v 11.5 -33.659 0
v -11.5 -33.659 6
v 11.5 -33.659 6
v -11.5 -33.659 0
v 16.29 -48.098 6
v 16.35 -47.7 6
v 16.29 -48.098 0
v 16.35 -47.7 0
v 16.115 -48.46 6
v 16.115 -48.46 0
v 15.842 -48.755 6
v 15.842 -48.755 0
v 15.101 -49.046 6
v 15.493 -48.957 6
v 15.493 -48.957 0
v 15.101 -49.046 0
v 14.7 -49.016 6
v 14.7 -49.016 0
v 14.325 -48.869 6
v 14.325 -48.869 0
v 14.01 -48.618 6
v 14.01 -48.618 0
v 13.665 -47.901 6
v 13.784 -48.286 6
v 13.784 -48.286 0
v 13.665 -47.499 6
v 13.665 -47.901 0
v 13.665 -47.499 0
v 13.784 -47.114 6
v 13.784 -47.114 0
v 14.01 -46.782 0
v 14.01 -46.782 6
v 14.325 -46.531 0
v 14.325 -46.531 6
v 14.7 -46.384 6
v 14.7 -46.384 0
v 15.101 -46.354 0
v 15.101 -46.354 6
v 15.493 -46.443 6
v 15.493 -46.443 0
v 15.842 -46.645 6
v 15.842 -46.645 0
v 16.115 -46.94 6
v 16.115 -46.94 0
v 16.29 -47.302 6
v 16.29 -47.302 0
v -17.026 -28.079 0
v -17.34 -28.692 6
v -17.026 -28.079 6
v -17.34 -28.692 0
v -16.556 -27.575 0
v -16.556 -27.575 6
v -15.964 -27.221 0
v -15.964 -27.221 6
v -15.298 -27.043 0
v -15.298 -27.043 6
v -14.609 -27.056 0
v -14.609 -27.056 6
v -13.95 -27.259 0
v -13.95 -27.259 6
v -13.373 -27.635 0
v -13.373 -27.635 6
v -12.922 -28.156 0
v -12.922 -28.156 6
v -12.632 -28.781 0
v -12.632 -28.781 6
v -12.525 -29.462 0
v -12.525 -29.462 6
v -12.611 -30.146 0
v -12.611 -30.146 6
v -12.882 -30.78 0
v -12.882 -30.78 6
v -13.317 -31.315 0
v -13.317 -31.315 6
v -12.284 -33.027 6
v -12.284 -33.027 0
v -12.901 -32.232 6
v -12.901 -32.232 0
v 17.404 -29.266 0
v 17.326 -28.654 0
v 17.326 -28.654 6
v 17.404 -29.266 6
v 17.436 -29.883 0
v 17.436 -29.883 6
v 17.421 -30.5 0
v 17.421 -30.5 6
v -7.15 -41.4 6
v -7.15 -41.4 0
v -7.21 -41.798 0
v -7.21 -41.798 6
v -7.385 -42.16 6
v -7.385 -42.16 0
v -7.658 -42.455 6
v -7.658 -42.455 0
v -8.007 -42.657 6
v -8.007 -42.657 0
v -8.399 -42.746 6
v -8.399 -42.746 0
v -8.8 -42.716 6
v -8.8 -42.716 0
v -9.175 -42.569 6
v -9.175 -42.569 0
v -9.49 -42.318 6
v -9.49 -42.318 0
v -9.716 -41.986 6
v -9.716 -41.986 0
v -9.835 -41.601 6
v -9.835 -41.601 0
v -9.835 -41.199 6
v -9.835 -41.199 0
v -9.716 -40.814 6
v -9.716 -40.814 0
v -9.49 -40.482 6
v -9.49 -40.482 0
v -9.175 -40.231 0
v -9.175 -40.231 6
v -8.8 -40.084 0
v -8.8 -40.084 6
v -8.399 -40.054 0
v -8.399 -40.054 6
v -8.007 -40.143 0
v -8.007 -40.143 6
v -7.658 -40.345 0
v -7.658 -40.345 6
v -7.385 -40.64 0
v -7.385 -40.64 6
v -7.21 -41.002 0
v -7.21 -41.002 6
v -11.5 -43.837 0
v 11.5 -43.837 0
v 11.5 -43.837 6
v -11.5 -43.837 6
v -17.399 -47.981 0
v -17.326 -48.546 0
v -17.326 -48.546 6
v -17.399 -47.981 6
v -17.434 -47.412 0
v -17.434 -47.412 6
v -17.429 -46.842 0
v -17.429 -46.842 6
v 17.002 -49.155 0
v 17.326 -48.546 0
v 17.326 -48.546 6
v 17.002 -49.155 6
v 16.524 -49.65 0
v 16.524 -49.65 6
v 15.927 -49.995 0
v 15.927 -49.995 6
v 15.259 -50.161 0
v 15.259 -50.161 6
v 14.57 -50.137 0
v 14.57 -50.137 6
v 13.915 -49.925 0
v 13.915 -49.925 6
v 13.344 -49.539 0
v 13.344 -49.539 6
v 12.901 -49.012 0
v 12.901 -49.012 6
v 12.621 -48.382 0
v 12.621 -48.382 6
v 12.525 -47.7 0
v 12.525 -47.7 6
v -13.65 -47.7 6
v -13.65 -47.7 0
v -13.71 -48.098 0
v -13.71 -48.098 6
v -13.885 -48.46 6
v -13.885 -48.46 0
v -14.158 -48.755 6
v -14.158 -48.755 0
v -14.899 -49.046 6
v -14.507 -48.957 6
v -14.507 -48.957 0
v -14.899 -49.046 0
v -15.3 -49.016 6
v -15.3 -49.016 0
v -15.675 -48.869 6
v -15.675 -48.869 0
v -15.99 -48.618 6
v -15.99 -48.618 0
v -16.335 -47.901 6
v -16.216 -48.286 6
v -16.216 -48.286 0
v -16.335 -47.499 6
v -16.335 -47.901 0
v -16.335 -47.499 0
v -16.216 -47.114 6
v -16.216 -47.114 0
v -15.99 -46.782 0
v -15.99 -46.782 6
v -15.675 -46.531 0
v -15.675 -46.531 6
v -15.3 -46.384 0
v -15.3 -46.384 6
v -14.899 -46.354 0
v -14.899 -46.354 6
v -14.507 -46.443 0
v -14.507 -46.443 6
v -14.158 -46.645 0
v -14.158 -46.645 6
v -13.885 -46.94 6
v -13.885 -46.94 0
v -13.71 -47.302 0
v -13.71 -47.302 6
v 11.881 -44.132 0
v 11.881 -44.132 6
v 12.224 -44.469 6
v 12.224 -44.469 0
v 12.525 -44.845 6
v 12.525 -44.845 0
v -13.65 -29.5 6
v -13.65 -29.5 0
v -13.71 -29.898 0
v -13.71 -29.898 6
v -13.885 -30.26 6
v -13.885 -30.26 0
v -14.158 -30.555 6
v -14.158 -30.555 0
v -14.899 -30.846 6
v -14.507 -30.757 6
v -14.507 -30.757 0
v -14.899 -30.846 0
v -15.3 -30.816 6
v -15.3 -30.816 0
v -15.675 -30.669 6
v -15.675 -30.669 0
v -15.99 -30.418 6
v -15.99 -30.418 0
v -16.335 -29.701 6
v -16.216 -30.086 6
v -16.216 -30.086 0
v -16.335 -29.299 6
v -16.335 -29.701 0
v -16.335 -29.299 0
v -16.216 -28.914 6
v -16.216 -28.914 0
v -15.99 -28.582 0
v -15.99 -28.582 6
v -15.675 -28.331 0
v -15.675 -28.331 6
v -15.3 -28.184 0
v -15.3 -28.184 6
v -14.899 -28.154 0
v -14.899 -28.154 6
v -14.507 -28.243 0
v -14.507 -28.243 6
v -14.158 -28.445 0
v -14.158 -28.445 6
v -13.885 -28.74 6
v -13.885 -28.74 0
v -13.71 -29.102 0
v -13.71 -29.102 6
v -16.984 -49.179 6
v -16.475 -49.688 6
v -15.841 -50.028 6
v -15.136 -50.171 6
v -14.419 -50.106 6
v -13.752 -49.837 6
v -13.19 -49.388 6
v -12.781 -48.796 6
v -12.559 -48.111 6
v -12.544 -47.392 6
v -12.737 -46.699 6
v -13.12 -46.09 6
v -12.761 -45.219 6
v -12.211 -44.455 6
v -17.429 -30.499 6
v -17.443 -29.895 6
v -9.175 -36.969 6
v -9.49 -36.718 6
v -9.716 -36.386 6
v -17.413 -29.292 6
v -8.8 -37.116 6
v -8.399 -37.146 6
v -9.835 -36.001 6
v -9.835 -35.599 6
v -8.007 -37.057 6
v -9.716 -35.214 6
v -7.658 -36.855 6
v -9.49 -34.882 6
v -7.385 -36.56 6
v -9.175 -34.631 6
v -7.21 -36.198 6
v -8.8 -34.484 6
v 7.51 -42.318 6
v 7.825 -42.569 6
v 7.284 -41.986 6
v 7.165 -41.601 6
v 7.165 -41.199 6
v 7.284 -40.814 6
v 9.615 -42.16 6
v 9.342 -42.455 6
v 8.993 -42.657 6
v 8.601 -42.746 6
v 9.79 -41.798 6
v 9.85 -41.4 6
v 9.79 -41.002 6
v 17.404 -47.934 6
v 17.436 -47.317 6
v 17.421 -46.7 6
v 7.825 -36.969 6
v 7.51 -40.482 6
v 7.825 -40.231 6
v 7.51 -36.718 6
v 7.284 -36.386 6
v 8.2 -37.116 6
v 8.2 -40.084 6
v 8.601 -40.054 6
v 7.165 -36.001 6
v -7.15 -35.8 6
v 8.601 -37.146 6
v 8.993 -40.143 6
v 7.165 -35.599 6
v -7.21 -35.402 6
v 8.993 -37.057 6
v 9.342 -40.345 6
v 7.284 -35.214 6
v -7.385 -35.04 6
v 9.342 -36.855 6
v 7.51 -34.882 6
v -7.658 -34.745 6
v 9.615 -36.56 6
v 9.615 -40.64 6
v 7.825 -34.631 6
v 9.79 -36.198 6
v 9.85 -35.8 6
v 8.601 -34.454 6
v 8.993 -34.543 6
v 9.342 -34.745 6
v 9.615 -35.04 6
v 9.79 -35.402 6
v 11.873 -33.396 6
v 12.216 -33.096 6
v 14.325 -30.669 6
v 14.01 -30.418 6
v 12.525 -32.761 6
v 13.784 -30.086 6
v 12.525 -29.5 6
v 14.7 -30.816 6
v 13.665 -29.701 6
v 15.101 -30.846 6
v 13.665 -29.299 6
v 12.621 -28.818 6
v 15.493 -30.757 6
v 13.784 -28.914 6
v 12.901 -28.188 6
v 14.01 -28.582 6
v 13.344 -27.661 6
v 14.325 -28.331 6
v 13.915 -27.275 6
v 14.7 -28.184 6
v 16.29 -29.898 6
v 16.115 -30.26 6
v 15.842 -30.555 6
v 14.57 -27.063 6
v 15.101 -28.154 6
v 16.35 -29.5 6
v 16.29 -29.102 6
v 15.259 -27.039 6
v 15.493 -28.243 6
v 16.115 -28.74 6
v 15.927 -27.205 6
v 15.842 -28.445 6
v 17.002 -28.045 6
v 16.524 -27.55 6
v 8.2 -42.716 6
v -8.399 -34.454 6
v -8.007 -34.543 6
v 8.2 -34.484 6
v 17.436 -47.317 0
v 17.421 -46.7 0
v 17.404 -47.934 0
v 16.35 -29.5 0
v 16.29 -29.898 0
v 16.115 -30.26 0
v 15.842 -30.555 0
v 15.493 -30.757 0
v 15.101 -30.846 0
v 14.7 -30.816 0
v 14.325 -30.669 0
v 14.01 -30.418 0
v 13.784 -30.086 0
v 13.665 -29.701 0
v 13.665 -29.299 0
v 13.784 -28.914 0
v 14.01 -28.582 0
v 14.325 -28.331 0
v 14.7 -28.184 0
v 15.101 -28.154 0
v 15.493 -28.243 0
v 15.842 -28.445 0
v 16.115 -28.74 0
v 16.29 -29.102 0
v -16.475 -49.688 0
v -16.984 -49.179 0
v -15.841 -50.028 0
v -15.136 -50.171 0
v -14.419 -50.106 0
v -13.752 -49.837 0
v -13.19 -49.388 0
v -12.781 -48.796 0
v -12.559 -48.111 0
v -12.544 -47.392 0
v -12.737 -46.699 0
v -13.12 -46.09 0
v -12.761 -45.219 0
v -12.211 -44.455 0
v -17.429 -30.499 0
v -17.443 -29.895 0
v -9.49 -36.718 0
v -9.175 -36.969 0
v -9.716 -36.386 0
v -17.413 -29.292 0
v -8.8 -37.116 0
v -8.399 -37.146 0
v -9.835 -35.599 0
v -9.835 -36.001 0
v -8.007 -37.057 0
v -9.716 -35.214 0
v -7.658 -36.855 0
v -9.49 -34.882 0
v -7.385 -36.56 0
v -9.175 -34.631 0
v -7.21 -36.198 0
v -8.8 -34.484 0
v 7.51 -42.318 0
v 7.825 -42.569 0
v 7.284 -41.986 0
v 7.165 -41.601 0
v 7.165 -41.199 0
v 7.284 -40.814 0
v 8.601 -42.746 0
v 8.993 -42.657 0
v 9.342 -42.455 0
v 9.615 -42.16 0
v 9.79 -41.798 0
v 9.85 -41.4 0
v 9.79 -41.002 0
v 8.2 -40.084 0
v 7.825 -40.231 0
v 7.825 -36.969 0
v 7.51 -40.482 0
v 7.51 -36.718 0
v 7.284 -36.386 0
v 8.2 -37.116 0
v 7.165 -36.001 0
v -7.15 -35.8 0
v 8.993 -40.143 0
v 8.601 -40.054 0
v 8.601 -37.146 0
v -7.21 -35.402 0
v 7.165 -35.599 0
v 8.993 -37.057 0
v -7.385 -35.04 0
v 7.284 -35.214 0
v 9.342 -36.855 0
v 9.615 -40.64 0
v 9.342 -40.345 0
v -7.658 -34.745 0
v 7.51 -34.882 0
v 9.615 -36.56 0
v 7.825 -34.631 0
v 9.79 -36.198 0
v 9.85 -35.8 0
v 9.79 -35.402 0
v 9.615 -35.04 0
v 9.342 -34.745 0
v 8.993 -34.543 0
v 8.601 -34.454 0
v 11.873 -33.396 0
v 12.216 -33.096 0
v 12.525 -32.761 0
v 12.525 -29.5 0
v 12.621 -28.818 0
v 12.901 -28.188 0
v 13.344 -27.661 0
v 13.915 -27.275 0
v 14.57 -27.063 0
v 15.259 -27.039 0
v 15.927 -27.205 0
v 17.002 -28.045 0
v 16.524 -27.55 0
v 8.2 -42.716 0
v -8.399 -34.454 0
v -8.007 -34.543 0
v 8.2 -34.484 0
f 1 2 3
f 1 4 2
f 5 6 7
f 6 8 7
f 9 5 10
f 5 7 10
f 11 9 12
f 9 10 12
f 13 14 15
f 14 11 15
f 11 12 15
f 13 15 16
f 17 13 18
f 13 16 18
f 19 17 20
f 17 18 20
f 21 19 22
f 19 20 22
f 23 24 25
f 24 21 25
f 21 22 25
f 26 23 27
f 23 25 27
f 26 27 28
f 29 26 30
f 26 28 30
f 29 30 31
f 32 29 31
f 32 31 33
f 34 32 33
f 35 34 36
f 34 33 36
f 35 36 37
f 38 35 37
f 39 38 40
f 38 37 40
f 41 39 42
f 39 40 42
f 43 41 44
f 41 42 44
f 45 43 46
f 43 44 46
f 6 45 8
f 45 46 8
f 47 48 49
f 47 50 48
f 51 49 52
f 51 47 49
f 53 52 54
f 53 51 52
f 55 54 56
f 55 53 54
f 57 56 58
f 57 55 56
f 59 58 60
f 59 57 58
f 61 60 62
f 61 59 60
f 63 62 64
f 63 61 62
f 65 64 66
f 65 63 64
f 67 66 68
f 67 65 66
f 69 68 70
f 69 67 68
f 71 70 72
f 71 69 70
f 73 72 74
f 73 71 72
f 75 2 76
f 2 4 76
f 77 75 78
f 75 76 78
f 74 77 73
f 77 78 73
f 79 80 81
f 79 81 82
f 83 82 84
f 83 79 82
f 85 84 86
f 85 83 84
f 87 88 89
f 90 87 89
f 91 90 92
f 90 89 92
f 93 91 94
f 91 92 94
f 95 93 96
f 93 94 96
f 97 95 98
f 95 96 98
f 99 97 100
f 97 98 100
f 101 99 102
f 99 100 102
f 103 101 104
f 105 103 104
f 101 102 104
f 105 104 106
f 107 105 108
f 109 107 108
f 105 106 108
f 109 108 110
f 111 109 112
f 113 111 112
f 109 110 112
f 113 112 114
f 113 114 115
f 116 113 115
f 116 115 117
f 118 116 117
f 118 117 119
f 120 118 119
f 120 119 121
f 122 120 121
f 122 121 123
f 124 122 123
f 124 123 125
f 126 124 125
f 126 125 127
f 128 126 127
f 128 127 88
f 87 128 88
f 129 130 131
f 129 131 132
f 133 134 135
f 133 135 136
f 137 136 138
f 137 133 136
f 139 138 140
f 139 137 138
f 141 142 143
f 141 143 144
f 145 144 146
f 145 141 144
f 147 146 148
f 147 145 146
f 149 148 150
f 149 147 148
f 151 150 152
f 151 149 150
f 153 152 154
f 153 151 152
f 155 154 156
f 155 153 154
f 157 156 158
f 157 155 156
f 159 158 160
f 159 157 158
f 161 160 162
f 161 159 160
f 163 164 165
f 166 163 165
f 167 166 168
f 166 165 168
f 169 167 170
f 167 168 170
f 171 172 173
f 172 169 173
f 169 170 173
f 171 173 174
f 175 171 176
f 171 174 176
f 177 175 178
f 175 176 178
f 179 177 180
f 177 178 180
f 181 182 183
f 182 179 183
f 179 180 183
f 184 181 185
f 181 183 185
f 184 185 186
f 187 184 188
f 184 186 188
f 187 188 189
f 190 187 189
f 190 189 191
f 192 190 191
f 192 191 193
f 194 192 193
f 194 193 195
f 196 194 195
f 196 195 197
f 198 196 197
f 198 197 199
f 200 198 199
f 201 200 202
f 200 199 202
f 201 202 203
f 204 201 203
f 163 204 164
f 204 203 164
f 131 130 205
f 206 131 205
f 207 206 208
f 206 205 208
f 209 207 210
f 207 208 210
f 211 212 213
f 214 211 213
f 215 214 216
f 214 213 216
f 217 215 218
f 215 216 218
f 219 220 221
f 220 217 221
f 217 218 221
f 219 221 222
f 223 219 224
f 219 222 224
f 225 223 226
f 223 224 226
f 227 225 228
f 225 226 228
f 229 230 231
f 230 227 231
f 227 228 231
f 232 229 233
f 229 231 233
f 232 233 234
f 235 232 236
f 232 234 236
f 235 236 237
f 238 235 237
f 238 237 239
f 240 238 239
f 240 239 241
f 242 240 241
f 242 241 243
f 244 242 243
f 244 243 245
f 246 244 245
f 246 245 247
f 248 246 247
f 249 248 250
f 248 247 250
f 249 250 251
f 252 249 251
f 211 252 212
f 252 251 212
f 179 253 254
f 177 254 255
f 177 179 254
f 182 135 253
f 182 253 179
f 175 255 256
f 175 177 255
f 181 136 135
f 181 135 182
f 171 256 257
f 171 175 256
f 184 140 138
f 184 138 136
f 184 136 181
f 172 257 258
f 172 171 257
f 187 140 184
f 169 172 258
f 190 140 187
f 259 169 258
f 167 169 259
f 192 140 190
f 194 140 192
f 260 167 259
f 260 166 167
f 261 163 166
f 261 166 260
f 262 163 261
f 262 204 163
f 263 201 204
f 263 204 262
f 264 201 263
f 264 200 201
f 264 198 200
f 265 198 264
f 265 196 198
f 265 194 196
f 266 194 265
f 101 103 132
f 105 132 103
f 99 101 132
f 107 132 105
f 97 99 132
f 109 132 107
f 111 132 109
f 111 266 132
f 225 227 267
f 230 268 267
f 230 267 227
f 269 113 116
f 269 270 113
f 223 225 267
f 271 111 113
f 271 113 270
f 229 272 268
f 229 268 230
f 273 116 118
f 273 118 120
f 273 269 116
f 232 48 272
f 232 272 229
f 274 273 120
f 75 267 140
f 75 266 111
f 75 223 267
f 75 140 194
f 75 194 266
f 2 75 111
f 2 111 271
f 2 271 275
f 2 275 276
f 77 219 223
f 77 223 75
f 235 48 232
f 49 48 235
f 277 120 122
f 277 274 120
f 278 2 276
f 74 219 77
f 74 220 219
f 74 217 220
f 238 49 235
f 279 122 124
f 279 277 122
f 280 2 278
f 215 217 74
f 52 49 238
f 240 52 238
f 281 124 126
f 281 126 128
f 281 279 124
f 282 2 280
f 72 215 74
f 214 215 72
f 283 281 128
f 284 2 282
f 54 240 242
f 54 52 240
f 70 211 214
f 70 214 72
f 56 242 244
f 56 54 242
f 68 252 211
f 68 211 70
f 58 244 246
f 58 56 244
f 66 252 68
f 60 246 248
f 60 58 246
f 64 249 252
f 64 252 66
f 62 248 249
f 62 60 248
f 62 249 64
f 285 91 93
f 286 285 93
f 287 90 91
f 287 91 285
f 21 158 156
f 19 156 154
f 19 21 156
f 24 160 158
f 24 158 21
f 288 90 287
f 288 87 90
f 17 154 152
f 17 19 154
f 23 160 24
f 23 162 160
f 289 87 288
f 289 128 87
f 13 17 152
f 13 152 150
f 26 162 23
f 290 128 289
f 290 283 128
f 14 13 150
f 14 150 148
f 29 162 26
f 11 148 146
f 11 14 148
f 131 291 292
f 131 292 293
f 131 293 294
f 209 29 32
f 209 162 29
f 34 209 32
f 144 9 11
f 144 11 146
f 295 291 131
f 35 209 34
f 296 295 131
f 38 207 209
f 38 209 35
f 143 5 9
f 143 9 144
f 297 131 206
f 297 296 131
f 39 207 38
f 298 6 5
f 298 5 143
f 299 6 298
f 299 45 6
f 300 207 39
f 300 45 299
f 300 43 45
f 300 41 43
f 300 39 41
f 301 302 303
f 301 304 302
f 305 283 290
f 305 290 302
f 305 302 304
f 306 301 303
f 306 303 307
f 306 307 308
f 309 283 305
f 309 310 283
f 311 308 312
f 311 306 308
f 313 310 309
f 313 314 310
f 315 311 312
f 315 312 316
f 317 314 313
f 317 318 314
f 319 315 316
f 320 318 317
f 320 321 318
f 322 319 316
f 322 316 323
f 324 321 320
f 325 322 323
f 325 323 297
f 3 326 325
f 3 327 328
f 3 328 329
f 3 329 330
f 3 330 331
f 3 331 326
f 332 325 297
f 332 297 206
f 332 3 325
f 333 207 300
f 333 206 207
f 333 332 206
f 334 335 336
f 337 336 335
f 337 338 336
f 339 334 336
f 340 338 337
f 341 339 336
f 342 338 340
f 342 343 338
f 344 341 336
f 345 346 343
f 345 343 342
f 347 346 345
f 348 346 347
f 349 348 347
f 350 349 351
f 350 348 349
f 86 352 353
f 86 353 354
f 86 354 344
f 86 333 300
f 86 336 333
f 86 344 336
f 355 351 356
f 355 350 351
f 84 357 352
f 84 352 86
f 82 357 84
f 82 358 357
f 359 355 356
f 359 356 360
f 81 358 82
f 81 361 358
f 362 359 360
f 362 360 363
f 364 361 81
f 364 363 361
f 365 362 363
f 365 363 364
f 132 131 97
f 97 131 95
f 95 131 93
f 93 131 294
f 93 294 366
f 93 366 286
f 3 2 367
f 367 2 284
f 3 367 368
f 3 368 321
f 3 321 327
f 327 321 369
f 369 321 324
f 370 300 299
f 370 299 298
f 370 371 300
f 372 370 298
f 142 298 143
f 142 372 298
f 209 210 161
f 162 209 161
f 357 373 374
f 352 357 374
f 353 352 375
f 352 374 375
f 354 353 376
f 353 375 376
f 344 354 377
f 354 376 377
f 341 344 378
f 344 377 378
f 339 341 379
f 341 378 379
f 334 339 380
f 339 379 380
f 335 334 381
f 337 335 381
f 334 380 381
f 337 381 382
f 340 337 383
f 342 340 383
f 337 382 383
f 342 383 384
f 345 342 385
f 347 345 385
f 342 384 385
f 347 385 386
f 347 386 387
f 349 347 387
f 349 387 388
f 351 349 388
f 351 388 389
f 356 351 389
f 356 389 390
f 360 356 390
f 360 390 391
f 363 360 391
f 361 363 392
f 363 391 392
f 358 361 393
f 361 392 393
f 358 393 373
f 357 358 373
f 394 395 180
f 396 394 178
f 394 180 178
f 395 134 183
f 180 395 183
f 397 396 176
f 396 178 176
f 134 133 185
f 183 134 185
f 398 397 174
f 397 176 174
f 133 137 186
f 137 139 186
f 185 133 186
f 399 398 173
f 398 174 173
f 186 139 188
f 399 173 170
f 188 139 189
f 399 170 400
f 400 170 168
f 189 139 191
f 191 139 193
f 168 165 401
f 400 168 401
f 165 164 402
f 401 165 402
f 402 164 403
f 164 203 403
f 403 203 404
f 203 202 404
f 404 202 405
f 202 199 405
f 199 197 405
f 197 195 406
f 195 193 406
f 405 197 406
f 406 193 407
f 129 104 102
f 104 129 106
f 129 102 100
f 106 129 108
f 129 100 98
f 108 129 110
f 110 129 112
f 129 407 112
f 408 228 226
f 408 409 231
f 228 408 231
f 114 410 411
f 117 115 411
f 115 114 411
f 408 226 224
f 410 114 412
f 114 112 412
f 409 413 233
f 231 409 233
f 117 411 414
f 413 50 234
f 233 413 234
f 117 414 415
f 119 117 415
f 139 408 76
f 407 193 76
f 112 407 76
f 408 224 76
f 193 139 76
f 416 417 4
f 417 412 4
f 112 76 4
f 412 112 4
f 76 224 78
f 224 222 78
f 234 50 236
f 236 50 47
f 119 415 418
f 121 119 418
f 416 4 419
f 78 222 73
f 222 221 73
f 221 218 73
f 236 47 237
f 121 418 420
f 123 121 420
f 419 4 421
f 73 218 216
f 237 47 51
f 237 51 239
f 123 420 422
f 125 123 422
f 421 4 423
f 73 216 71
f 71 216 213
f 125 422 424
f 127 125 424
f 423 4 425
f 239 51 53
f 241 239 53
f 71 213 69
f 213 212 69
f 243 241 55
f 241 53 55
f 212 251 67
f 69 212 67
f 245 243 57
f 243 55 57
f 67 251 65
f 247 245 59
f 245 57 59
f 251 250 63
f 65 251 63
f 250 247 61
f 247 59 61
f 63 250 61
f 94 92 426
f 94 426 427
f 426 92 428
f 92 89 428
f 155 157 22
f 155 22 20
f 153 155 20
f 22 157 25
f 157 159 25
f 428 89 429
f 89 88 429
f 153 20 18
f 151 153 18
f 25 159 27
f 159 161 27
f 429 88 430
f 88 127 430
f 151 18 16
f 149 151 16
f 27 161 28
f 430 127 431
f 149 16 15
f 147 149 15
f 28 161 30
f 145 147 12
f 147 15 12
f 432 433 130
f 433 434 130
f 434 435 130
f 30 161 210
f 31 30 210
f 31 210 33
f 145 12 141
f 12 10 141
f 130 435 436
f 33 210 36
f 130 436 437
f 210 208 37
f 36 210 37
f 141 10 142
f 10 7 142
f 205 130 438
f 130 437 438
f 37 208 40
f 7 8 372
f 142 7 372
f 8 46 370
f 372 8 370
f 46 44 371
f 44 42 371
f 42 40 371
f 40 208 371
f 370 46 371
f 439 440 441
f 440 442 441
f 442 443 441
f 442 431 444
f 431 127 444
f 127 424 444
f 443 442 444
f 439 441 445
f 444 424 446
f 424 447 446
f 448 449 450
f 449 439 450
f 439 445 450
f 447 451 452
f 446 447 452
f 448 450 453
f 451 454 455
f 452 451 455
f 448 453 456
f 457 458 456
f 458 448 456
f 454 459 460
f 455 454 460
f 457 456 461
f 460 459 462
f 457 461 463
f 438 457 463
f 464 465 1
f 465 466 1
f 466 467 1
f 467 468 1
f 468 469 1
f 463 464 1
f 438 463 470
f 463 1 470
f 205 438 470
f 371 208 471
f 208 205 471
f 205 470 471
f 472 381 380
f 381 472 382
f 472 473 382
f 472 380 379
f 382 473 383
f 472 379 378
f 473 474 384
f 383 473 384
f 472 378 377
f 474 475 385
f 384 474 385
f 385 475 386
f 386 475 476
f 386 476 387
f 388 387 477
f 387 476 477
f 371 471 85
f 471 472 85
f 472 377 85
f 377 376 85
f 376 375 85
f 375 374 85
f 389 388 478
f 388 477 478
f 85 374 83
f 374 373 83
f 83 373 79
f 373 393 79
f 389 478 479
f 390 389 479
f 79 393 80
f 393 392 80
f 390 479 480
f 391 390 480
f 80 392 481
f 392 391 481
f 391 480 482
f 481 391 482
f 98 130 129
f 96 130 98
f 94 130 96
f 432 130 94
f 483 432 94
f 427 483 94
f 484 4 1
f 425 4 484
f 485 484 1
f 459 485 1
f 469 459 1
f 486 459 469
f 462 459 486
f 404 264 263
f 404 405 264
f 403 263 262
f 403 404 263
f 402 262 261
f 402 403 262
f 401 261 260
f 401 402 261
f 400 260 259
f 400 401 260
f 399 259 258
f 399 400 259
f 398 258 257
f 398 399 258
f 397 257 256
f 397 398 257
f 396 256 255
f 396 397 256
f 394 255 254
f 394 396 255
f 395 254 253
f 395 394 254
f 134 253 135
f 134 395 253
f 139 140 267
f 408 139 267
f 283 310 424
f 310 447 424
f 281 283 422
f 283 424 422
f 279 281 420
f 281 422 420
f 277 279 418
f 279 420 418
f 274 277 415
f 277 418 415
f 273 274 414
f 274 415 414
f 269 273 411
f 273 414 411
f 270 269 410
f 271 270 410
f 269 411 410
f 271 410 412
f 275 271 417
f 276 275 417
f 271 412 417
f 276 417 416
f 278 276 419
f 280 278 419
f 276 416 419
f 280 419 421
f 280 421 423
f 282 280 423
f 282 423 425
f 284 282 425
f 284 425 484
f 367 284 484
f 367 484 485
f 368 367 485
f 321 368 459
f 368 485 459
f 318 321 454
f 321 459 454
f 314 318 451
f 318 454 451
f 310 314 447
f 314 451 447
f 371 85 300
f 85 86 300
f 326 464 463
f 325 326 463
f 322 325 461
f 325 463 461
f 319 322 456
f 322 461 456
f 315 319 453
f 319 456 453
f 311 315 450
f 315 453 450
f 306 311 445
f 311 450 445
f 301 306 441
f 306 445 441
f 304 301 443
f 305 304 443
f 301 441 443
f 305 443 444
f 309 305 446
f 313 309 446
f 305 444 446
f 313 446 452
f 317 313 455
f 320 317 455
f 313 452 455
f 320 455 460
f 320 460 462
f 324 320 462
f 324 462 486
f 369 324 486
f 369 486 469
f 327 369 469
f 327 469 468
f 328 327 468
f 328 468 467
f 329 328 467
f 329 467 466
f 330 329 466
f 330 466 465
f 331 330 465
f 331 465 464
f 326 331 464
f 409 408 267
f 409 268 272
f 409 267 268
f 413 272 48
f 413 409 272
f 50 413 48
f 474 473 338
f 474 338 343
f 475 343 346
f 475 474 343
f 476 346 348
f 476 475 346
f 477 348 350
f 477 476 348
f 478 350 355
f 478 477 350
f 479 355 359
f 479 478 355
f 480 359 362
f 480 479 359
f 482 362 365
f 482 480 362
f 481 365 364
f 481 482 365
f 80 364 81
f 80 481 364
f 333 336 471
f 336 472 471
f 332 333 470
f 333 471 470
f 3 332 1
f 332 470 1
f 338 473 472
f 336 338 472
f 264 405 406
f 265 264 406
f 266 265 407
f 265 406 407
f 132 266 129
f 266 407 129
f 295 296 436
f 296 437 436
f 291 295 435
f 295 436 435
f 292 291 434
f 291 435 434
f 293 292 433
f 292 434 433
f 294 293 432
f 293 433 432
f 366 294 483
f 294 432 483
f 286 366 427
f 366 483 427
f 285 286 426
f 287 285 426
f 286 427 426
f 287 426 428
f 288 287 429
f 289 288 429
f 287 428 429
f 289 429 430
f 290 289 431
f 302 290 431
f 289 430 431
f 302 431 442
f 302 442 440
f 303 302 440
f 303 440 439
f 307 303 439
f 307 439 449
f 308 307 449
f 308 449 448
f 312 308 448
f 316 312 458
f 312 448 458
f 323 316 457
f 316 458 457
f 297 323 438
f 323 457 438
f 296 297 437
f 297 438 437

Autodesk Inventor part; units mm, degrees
ref_plane "YZ Plane" through (0, 0, 0) normal (1, 0, 0) x (0, 1, 0)
ref_plane "XZ Plane" through (0, 0, 0) normal (0, 1, 0) x (-1, 0, 0)
ref_plane "XY Plane" through (0, 0, 0) normal (0, 0, 1) x (1, 0, 0)
ref_plane "작업 평면1" through (0, 0, 0) normal (0, 0, 1) x (1, 0, 0)
sketch "스케치1" plane through (0, 0, 0) normal (0, 0, 1) x (1, 0, 0)
  line L0 (12.7, -89.2) -> (9.2, -89.2) projected
  line L1 (12.7, -89.2) -> (17.8, -83.2) projected
  line L2 (17.8, -83.2) -> (17.8, -44.6) projected
  line L3 (17.8, -44.6) -> (12.7, -38.6) projected
  line L4 (12.7, -38.6) -> (-12.7, -38.6) projected
  line L5 (-12.7, -38.6) -> (-17.8, -44.6) projected
  line L6 (-17.8, -44.6) -> (-17.8, -83.2) projected
  line L7 (-17.8, -83.2) -> (-12.7, -89.2) projected
  line L8 (-9.2, -89.2) -> (-12.7, -89.2) projected
  arc A0 (-12.2, -86.2) -> (-9.2, -89.2) centre (-9.2, -86.2) ccw projected
  line L9 (-12.2, -47.2) -> (-12.2, -86.2) projected
  arc A1 (-9.2, -44.2) -> (-12.2, -47.2) centre (-9.2, -47.2) ccw projected
  line L10 (9.2, -44.2) -> (-9.2, -44.2) projected
  arc A2 (12.2, -47.2) -> (9.2, -44.2) centre (9.2, -47.2) ccw projected
  line L11 (12.2, -86.2) -> (12.2, -47.2) projected
  arc A3 (9.2, -89.2) -> (12.2, -86.2) centre (9.2, -86.2) ccw projected
  circle A4 centre (15, -81.7) radius 1.35 projected
  circle A5 centre (15, -64.7) radius 1.35 projected
  circle A6 centre (8.5, -41.4) radius 1.35 projected
  circle A7 centre (-15, -81.7) radius 1.35 projected
  circle A8 centre (-15, -64.7) radius 1.35 projected
  circle A9 centre (-8.5, -41.4) radius 1.35 projected
  circle A10 centre (15, -47.7) radius 1.35 projected
  circle A11 centre (-15, -47.7) radius 1.35 projected
  line L12 (-12.7, 12) -> (-9.2, 12) projected
  line L13 (-12.7, 12) -> (-17.8, 6) projected
  line L14 (-17.8, 6) -> (-17.8, -32.6) projected
  line L15 (-17.8, -32.6) -> (-12.7, -38.6) projected
  line L16 (-12.7, -38.6) -> (12.7, -38.6) projected
  line L17 (12.7, -38.6) -> (17.8, -32.6) projected
  line L18 (17.8, -32.6) -> (17.8, 6) projected
  line L19 (17.8, 6) -> (12.7, 12) projected
  line L20 (9.2, 12) -> (12.7, 12) projected
  arc A12 (12.2, 9) -> (9.2, 12) centre (9.2, 9) ccw projected
  line L21 (12.2, -30) -> (12.2, 9) projected
  arc A13 (9.2, -33) -> (12.2, -30) centre (9.2, -30) ccw projected
  line L22 (-9.2, -33) -> (9.2, -33) projected
  arc A14 (-12.2, -30) -> (-9.2, -33) centre (-9.2, -30) ccw projected
  line L23 (-12.2, 9) -> (-12.2, -30) projected
  arc A15 (-9.2, 12) -> (-12.2, 9) centre (-9.2, 9) ccw projected
  circle A16 centre (-15, 4.5) radius 1.35 projected
  circle A17 centre (-15, -12.5) radius 1.35 projected
  circle A18 centre (-8.5, -35.8) radius 1.35 projected
  circle A19 centre (15, 4.5) radius 1.35 projected
  circle A20 centre (15, -12.5) radius 1.35 projected
  circle A21 centre (8.5, -35.8) radius 1.35 projected
  circle A22 centre (-15, -29.5) radius 1.35 projected
  circle A23 centre (15, -29.5) radius 1.35 projected
  line L24 (-8.5, -43.8367) -> (-8.5, -33.6588)
  line L25 (-8.5, -33.6588) -> (8.5, -33.6588)
  line L26 (8.5, -33.6588) -> (8.5, -43.8367)
  line L27 (8.5, -43.8367) -> (-8.5, -43.8367)
  line L28 (-8.5, -43.8367) -> (-8.5, -33.6588)
  line L29 (-8.5, -33.6588) -> (-11.5, -33.6588)
  line L30 (-11.5, -33.6588) -> (-11.5, -43.8367)
  line L31 (-11.5, -43.8367) -> (-8.5, -43.8367)
  line L32 (8.5, -43.8367) -> (8.5, -33.6588)
  line L33 (8.5, -33.6588) -> (11.5, -33.6588)
  line L34 (11.5, -33.6588) -> (11.5, -43.8367)
  line L35 (11.5, -43.8367) -> (8.5, -43.8367)
  circle A24 centre (15, -47.7) radius 2.8
  circle A25 centre (15, -29.5) radius 2.8
  circle A26 centre (-15, -47.7) radius 2.8
  circle A27 centre (-15, -29.5) radius 2.8
  line L36 (17.8, -50.175) -> (13.5711, -50.175) projected
  line L37 (13.5711, -27.025) -> (17.8, -27.025) projected
  line L38 (-13.5711, -50.175) -> (-17.8, -50.175) projected
  line L39 (-17.8, -27.025) -> (-13.5711, -27.025) projected
  circle A28 centre (15, -47.7) radius 2.475
  circle A29 centre (15, -29.5) radius 2.475
  circle A30 centre (-15, -47.7) radius 2.475
  circle A31 centre (-15, -29.5) radius 2.475
  line L40 (15, -29.5) -> (11.5, -29.5)
  line L41 (12.525, -29.5) -> (12.525, -47.7)
  line L42 (12.525, -47.7) -> (12.525, -49.0093)
  line L43 (12.525, -29.5) -> (12.525, -28.1907)
  circle A32 centre (9.2, -47.2) radius 4.0745
  circle A33 centre (9.2, -30) radius 4.3217
  circle A34 centre (9.2, -47.2) radius 8.2366
  circle A35 centre (9.2, -30) radius 8.2366
  circle A36 centre (-9.2, -47.2) radius 8.2366
  circle A37 centre (-9.2, -30) radius 8.2439
  circle A38 centre (-9.2, -47.2) radius 4.0745
  circle A39 centre (-9.2, -30) radius 4.3217
  point P0 (0, 0)
  point P1 (-13.3169, -31.3146)
  point P2 (-17.3396, -28.6926)
  point P3 (-15.7015, -35.0688)
  point P4 (-15.25, -35.6)
  point P5 (-11.5, -37.9166)
  point P6 (-11.5, -39.2911)
  point P7 (-17.3258, -48.5464)
  point P8 (-13.1204, -46.0899)
  point P9 (12.525, -44.845)
  point P10 (17.3258, -48.5464)
  point P11 (12.525, -39.6644)
  point P12 (12.525, -37.5356)
  point P13 (17.3258, -28.6536)
  point P14 (12.525, -32.7607)
  dimension "d0" = 3
  dimension "d1" = 3
extrude "돌출2" add sketch "스케치1" along normal blind 6 contours A34 A28 A32 A24 | A24 A32 L41 A34 | A34 L26 A6 A32 L27 | L27 A36 L24 L4 L26 A34 | A32 A28 L41 A24 | A24 L41 A32 | A28 A32 A34 | A32 L26 L27 | A28 A32 | L27 A38 L24 A9 A36 | A34 L34 A32 L26 A6 | L26 L4 L34 A34 | A34 L34 L4 L41 | L41 A32 L34 A34 | L26 A32 L35 | L27 L24 A38 | A36 L30 L4 L24 | L24 A9 A38 L30 A36 | L26 A35 L34 L4 | L4 L24 A37 L25 A35 L26 | L4 L34 A35 L41 | A35 L41 A33 A25 | L31 A38 L24 | L4 L30 A37 L24 | L30 A38 A26 A36 | A35 L25 A33 L26 A21 | L26 A21 A33 L34 A35 | A35 L34 A33 L41 | A25 A33 A29 A35 | A37 L30 A39 L24 A18 | L24 A18 A39 L25 A37 | L41 A25 A33 | A25 L41 A29 A33 | A38 A30 A36 A26 | A38 A30 | A30 A36 A38 | A37 L15 A27 A39 L30 | A33 L26 L33 | L25 L26 A33 | A33 A29 A35 | A29 L40 A33 | L29 L24 A39 | A39 L24 L25 | A29 A33 L40 | A27 A37 A31 A39 | A39 A31 | A31 A37 A39
sketch "스케치2" plane through (0, 0, 6) normal (0, 0, 1) x (1, 0, 0)
  line L0 (11.5, -33.6588) -> (-11.5, -33.6588) projected
  arc A0 (-13.3169, -31.3146) -> (-11.5, -33.6588) centre (-9.2, -30) ccw projected
  arc A1 (-13.3169, -31.3146) -> (-17.3396, -28.6926) centre (-15, -29.5) ccw projected
  arc A2 (-17.3396, -28.6926) -> (-15.7015, -35.0688) centre (-9.2, -30) ccw projected
  line L1 (-15.7015, -35.0688) -> (-15.25, -35.6) projected
  arc A3 (-15.25, -35.6) -> (-11.5, -37.9166) centre (-9.2, -30) ccw projected
  line L2 (-11.5, -37.9166) -> (-11.5, -39.2911) projected
  arc A4 (-11.5, -39.2911) -> (-17.3258, -48.5464) centre (-9.2, -47.2) ccw projected
  arc A5 (-17.3258, -48.5464) -> (-13.1204, -46.0899) centre (-15, -47.7) ccw projected
  arc A6 (-11.5, -43.8367) -> (-13.1204, -46.0899) centre (-9.2, -47.2) ccw projected
  line L3 (-11.5, -43.8367) -> (11.5, -43.8367) projected
  arc A7 (12.525, -44.845) -> (11.5, -43.8367) centre (9.2, -47.2) ccw projected
  line L4 (12.525, -44.845) -> (12.525, -47.7) projected
  arc A8 (12.525, -47.7) -> (17.3258, -48.5464) centre (15, -47.7) ccw projected
  arc A9 (17.3258, -48.5464) -> (12.525, -39.6644) centre (9.2, -47.2) ccw projected
  line L5 (12.525, -39.6644) -> (12.525, -37.5356) projected
  arc A10 (12.525, -37.5356) -> (17.3258, -28.6536) centre (9.2, -30) ccw projected
  arc A11 (17.3258, -28.6536) -> (12.525, -29.5) centre (15, -29.5) ccw projected
  line L6 (12.525, -29.5) -> (12.525, -32.7607) projected
  arc A12 (11.5, -33.6588) -> (12.525, -32.7607) centre (9.2, -30) ccw projected
  circle A13 centre (15, -47.7) radius 1.35 projected
  circle A14 centre (8.5, -35.8) radius 1.35 projected
  circle A15 centre (15, -29.5) radius 1.35 projected
  circle A16 centre (8.5, -41.4) radius 1.35 projected
  circle A17 centre (-8.5, -41.4) radius 1.35 projected
  circle A18 centre (-15, -47.7) radius 1.35 projected
  circle A19 centre (-15, -29.5) radius 1.35 projected
  circle A20 centre (-8.5, -35.8) radius 1.35 projected
  line L7 (-17.4288, -29.5) -> (17.4214, -29.5)
  line L8 (-15, -47.7) -> (17.4214, -47.7)
  line L9 (-15, -47.7) -> (-18, -47.7)
  line L10 (-15, -47.7) -> (-12, -47.7) construction
  line L11 (17.4214, -29.5) -> (17.4214, -47.7)
  line L12 (17.4214, -47.7) -> (-17.4288, -47.7)
  line L13 (-17.4288, -47.7) -> (-17.4288, -29.5)
  line L14 (-17.4288, -29.5) -> (17.4214, -29.5)
  point P0 (0, 0)
  point P1 (17.4214, -46.7)
  point P2 (17.4214, -30.5)
  point P3 (-17.4288, -30.5)
  point P4 (-17.4288, -46.8415)
  dimension "d6" = 3
  dimension "d7" = 180
extrude "돌출3" add sketch "스케치2" against normal blind 6 contours L11 A9 L5 A10 | A2 L1 A3 L2 A4 L13
properties part number "_arm_adt" material "PMMA 플라스틱"
